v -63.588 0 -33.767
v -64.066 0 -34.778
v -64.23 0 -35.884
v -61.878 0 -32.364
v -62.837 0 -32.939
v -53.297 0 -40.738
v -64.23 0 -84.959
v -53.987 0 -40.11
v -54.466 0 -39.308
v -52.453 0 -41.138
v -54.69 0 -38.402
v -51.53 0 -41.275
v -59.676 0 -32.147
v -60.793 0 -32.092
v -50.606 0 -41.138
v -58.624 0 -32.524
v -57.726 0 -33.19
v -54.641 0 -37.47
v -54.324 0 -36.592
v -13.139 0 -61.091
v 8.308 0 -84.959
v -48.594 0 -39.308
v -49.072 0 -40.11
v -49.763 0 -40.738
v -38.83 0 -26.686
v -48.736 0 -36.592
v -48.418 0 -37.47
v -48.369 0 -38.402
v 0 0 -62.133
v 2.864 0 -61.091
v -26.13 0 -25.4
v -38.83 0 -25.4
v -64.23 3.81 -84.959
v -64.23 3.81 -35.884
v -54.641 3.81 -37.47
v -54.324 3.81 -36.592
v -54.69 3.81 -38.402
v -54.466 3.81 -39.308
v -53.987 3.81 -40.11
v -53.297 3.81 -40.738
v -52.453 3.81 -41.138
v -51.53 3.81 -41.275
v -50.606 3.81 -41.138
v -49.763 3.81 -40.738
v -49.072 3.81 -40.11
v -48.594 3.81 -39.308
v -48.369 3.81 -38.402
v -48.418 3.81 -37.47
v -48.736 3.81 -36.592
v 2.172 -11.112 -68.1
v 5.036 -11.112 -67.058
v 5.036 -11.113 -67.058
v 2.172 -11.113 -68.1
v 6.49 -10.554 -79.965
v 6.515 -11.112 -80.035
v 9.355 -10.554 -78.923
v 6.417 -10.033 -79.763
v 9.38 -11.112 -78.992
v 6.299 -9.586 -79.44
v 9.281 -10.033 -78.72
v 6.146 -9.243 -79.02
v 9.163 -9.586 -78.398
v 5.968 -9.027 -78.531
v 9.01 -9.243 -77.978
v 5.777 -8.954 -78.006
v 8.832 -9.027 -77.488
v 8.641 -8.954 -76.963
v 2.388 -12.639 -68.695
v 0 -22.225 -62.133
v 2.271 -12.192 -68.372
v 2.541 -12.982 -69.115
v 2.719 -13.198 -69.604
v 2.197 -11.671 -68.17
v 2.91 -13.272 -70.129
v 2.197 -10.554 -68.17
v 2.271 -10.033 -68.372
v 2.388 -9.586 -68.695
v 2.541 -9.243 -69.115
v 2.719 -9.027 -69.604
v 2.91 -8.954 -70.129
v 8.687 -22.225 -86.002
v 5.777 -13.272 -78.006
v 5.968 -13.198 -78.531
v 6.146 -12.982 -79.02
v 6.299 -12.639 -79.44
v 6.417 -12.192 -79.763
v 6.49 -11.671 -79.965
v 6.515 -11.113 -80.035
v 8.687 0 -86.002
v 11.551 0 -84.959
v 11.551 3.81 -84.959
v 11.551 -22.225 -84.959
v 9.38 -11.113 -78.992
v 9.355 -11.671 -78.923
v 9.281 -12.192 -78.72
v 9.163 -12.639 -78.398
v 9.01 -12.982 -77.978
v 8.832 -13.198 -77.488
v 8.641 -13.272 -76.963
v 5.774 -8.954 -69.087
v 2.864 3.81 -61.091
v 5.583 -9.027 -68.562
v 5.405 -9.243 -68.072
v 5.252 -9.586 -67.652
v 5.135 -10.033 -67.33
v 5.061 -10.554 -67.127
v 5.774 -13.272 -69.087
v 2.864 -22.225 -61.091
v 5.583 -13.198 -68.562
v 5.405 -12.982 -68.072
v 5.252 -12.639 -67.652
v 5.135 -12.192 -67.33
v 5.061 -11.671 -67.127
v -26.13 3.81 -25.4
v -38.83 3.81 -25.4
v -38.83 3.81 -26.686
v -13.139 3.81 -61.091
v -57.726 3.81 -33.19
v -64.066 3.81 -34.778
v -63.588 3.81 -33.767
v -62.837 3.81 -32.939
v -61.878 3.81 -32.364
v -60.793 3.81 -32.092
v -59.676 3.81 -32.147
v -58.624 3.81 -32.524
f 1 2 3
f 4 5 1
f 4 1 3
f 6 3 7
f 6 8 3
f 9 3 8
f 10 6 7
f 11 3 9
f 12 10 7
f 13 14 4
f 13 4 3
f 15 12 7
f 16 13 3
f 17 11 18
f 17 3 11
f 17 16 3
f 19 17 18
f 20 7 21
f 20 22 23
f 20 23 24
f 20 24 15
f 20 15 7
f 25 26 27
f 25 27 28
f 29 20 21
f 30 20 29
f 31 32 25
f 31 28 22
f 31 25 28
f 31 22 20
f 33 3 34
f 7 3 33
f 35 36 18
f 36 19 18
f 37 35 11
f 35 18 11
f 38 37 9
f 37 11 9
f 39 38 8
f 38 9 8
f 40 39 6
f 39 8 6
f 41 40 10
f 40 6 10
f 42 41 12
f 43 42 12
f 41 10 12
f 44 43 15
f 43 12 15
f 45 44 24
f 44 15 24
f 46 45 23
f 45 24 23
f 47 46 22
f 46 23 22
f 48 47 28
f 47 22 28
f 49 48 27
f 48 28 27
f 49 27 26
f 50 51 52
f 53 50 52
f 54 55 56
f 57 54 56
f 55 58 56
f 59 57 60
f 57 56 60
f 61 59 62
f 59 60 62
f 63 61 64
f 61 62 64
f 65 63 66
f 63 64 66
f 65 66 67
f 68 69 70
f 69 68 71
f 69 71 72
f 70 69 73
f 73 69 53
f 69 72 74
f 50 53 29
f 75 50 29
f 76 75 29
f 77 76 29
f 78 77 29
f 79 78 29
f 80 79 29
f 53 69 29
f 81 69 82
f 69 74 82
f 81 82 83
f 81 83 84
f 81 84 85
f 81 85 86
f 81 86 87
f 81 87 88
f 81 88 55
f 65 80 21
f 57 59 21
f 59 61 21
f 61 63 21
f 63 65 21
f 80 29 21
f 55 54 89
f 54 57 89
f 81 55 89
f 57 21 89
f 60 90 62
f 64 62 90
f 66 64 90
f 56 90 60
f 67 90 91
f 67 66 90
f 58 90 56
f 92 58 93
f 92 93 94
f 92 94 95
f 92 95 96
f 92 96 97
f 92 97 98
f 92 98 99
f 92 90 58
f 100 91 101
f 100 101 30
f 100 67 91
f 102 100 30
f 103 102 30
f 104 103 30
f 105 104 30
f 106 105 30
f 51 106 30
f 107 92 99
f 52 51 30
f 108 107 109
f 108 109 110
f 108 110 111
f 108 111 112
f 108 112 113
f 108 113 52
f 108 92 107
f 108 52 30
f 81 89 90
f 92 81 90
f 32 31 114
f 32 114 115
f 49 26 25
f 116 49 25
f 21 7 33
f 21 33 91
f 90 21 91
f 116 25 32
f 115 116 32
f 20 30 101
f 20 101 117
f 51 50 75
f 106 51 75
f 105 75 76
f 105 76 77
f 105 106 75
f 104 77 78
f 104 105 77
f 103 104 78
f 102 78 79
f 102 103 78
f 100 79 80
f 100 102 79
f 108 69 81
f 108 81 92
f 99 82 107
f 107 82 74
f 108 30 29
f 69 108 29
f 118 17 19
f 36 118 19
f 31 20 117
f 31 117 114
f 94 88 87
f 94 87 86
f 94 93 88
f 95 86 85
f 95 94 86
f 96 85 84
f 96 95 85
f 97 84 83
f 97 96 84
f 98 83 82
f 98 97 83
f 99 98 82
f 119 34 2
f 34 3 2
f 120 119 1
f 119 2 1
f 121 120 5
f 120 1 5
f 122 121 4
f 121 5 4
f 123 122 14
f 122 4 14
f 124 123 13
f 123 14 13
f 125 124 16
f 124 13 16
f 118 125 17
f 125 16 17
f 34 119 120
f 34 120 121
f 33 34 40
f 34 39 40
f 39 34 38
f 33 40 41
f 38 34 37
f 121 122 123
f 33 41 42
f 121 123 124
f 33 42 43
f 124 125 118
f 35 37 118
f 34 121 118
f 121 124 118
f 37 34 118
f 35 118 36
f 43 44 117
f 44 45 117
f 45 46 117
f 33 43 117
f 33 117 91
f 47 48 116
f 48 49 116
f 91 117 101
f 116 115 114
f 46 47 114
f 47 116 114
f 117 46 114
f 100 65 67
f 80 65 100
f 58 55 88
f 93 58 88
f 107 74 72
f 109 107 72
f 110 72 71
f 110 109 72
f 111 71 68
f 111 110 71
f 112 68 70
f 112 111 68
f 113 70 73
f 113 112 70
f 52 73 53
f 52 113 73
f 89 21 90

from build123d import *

# Parameters (mm, degrees)
F1_DEPTH = 22.225
F2_W     = 4.318
F2_H     = 12.7
F3_DEPTH = 11.212402643
F4_R     = 2.15899
F5_R     = 3.175
F6_DEPTH = 3.81
F8_DEPTH = 25.4
F9_R     = 3.81


# Not quite as in the source:
# - a fillet or chamfer is up to 0.001 mm smaller than in the source, because OpenCascade refuses the exact size


with BuildPart() as f1:
    # F0 (on Front) → F1 (new body)
    with BuildSketch(Plane.XZ):
        Polygon((11.5514947486, -84.959096284), (2.8641831082, -61.090903716), (0, -62.1333811129), (8.6873116405, -86.0015736808), align=None)
    extrude(amount=F1_DEPTH)

    # F2 (on face) → F3 (cut, through all)
    with BuildSketch(Plane(origin=(-19.9692837636, 0, -7.2682248896), x_dir=(0, -1, 0), z_dir=(-0.9396926208, 0, -0.3420201433))):
        with Locations((11.1125, -71.0862797362)):
            Rectangle(F2_W, F2_H)
        with Locations((11.1125, -93.3112797362)):
            Rectangle(F2_W, F2_H)
    extrude(amount=-F3_DEPTH, mode=Mode.SUBTRACT)

    # F4 (radius 2.159 in the source; OpenCascade refuses exactly that, so slightly less here)
    f4_edges = [f1.edges().sort_by_distance(p)[0] for p in [
        (3.603919, -8.9535, -67.579191),
        (3.603919, -13.2715, -67.579191),
        (7.947575, -13.2715, -79.513287),
        (7.947575, -8.9535, -79.513287),
    ]]
    fillet(f4_edges, radius=F4_R)

    # F5 (on Front) → F6 (join)
    with BuildSketch(Plane.XZ):
        Polygon((11.5514947486, -84.959096284), (2.8641831082, -61.090903716), (-13.1392344849, -61.090903716), (-26.1296610716, -25.4), (-64.2296610716, -25.4), (-64.2296610716, -84.959096284), align=None)
        with Locations((-51.5296610716, -38.1)):
            Circle(F5_R, mode=Mode.SUBTRACT)
    extrude(amount=-F6_DEPTH)

    # F7 (on Front) → F8 (cut)
    with BuildSketch(Plane.XZ):
        Polygon((-65.5156196266, -25.4), (-51.5296610716, -39.3859585549), (-38.8296610716, -26.6859585549), (-38.8296610716, -25.4), align=None)
    extrude(amount=-F8_DEPTH, mode=Mode.SUBTRACT)

    # F9
    f9_edges = [f1.edges().sort_by_distance(p)[0] for p in [
        (-64.229661, 1.905, -26.685959),
    ]]
    fillet(f9_edges, radius=F9_R)


solid = f1.part
